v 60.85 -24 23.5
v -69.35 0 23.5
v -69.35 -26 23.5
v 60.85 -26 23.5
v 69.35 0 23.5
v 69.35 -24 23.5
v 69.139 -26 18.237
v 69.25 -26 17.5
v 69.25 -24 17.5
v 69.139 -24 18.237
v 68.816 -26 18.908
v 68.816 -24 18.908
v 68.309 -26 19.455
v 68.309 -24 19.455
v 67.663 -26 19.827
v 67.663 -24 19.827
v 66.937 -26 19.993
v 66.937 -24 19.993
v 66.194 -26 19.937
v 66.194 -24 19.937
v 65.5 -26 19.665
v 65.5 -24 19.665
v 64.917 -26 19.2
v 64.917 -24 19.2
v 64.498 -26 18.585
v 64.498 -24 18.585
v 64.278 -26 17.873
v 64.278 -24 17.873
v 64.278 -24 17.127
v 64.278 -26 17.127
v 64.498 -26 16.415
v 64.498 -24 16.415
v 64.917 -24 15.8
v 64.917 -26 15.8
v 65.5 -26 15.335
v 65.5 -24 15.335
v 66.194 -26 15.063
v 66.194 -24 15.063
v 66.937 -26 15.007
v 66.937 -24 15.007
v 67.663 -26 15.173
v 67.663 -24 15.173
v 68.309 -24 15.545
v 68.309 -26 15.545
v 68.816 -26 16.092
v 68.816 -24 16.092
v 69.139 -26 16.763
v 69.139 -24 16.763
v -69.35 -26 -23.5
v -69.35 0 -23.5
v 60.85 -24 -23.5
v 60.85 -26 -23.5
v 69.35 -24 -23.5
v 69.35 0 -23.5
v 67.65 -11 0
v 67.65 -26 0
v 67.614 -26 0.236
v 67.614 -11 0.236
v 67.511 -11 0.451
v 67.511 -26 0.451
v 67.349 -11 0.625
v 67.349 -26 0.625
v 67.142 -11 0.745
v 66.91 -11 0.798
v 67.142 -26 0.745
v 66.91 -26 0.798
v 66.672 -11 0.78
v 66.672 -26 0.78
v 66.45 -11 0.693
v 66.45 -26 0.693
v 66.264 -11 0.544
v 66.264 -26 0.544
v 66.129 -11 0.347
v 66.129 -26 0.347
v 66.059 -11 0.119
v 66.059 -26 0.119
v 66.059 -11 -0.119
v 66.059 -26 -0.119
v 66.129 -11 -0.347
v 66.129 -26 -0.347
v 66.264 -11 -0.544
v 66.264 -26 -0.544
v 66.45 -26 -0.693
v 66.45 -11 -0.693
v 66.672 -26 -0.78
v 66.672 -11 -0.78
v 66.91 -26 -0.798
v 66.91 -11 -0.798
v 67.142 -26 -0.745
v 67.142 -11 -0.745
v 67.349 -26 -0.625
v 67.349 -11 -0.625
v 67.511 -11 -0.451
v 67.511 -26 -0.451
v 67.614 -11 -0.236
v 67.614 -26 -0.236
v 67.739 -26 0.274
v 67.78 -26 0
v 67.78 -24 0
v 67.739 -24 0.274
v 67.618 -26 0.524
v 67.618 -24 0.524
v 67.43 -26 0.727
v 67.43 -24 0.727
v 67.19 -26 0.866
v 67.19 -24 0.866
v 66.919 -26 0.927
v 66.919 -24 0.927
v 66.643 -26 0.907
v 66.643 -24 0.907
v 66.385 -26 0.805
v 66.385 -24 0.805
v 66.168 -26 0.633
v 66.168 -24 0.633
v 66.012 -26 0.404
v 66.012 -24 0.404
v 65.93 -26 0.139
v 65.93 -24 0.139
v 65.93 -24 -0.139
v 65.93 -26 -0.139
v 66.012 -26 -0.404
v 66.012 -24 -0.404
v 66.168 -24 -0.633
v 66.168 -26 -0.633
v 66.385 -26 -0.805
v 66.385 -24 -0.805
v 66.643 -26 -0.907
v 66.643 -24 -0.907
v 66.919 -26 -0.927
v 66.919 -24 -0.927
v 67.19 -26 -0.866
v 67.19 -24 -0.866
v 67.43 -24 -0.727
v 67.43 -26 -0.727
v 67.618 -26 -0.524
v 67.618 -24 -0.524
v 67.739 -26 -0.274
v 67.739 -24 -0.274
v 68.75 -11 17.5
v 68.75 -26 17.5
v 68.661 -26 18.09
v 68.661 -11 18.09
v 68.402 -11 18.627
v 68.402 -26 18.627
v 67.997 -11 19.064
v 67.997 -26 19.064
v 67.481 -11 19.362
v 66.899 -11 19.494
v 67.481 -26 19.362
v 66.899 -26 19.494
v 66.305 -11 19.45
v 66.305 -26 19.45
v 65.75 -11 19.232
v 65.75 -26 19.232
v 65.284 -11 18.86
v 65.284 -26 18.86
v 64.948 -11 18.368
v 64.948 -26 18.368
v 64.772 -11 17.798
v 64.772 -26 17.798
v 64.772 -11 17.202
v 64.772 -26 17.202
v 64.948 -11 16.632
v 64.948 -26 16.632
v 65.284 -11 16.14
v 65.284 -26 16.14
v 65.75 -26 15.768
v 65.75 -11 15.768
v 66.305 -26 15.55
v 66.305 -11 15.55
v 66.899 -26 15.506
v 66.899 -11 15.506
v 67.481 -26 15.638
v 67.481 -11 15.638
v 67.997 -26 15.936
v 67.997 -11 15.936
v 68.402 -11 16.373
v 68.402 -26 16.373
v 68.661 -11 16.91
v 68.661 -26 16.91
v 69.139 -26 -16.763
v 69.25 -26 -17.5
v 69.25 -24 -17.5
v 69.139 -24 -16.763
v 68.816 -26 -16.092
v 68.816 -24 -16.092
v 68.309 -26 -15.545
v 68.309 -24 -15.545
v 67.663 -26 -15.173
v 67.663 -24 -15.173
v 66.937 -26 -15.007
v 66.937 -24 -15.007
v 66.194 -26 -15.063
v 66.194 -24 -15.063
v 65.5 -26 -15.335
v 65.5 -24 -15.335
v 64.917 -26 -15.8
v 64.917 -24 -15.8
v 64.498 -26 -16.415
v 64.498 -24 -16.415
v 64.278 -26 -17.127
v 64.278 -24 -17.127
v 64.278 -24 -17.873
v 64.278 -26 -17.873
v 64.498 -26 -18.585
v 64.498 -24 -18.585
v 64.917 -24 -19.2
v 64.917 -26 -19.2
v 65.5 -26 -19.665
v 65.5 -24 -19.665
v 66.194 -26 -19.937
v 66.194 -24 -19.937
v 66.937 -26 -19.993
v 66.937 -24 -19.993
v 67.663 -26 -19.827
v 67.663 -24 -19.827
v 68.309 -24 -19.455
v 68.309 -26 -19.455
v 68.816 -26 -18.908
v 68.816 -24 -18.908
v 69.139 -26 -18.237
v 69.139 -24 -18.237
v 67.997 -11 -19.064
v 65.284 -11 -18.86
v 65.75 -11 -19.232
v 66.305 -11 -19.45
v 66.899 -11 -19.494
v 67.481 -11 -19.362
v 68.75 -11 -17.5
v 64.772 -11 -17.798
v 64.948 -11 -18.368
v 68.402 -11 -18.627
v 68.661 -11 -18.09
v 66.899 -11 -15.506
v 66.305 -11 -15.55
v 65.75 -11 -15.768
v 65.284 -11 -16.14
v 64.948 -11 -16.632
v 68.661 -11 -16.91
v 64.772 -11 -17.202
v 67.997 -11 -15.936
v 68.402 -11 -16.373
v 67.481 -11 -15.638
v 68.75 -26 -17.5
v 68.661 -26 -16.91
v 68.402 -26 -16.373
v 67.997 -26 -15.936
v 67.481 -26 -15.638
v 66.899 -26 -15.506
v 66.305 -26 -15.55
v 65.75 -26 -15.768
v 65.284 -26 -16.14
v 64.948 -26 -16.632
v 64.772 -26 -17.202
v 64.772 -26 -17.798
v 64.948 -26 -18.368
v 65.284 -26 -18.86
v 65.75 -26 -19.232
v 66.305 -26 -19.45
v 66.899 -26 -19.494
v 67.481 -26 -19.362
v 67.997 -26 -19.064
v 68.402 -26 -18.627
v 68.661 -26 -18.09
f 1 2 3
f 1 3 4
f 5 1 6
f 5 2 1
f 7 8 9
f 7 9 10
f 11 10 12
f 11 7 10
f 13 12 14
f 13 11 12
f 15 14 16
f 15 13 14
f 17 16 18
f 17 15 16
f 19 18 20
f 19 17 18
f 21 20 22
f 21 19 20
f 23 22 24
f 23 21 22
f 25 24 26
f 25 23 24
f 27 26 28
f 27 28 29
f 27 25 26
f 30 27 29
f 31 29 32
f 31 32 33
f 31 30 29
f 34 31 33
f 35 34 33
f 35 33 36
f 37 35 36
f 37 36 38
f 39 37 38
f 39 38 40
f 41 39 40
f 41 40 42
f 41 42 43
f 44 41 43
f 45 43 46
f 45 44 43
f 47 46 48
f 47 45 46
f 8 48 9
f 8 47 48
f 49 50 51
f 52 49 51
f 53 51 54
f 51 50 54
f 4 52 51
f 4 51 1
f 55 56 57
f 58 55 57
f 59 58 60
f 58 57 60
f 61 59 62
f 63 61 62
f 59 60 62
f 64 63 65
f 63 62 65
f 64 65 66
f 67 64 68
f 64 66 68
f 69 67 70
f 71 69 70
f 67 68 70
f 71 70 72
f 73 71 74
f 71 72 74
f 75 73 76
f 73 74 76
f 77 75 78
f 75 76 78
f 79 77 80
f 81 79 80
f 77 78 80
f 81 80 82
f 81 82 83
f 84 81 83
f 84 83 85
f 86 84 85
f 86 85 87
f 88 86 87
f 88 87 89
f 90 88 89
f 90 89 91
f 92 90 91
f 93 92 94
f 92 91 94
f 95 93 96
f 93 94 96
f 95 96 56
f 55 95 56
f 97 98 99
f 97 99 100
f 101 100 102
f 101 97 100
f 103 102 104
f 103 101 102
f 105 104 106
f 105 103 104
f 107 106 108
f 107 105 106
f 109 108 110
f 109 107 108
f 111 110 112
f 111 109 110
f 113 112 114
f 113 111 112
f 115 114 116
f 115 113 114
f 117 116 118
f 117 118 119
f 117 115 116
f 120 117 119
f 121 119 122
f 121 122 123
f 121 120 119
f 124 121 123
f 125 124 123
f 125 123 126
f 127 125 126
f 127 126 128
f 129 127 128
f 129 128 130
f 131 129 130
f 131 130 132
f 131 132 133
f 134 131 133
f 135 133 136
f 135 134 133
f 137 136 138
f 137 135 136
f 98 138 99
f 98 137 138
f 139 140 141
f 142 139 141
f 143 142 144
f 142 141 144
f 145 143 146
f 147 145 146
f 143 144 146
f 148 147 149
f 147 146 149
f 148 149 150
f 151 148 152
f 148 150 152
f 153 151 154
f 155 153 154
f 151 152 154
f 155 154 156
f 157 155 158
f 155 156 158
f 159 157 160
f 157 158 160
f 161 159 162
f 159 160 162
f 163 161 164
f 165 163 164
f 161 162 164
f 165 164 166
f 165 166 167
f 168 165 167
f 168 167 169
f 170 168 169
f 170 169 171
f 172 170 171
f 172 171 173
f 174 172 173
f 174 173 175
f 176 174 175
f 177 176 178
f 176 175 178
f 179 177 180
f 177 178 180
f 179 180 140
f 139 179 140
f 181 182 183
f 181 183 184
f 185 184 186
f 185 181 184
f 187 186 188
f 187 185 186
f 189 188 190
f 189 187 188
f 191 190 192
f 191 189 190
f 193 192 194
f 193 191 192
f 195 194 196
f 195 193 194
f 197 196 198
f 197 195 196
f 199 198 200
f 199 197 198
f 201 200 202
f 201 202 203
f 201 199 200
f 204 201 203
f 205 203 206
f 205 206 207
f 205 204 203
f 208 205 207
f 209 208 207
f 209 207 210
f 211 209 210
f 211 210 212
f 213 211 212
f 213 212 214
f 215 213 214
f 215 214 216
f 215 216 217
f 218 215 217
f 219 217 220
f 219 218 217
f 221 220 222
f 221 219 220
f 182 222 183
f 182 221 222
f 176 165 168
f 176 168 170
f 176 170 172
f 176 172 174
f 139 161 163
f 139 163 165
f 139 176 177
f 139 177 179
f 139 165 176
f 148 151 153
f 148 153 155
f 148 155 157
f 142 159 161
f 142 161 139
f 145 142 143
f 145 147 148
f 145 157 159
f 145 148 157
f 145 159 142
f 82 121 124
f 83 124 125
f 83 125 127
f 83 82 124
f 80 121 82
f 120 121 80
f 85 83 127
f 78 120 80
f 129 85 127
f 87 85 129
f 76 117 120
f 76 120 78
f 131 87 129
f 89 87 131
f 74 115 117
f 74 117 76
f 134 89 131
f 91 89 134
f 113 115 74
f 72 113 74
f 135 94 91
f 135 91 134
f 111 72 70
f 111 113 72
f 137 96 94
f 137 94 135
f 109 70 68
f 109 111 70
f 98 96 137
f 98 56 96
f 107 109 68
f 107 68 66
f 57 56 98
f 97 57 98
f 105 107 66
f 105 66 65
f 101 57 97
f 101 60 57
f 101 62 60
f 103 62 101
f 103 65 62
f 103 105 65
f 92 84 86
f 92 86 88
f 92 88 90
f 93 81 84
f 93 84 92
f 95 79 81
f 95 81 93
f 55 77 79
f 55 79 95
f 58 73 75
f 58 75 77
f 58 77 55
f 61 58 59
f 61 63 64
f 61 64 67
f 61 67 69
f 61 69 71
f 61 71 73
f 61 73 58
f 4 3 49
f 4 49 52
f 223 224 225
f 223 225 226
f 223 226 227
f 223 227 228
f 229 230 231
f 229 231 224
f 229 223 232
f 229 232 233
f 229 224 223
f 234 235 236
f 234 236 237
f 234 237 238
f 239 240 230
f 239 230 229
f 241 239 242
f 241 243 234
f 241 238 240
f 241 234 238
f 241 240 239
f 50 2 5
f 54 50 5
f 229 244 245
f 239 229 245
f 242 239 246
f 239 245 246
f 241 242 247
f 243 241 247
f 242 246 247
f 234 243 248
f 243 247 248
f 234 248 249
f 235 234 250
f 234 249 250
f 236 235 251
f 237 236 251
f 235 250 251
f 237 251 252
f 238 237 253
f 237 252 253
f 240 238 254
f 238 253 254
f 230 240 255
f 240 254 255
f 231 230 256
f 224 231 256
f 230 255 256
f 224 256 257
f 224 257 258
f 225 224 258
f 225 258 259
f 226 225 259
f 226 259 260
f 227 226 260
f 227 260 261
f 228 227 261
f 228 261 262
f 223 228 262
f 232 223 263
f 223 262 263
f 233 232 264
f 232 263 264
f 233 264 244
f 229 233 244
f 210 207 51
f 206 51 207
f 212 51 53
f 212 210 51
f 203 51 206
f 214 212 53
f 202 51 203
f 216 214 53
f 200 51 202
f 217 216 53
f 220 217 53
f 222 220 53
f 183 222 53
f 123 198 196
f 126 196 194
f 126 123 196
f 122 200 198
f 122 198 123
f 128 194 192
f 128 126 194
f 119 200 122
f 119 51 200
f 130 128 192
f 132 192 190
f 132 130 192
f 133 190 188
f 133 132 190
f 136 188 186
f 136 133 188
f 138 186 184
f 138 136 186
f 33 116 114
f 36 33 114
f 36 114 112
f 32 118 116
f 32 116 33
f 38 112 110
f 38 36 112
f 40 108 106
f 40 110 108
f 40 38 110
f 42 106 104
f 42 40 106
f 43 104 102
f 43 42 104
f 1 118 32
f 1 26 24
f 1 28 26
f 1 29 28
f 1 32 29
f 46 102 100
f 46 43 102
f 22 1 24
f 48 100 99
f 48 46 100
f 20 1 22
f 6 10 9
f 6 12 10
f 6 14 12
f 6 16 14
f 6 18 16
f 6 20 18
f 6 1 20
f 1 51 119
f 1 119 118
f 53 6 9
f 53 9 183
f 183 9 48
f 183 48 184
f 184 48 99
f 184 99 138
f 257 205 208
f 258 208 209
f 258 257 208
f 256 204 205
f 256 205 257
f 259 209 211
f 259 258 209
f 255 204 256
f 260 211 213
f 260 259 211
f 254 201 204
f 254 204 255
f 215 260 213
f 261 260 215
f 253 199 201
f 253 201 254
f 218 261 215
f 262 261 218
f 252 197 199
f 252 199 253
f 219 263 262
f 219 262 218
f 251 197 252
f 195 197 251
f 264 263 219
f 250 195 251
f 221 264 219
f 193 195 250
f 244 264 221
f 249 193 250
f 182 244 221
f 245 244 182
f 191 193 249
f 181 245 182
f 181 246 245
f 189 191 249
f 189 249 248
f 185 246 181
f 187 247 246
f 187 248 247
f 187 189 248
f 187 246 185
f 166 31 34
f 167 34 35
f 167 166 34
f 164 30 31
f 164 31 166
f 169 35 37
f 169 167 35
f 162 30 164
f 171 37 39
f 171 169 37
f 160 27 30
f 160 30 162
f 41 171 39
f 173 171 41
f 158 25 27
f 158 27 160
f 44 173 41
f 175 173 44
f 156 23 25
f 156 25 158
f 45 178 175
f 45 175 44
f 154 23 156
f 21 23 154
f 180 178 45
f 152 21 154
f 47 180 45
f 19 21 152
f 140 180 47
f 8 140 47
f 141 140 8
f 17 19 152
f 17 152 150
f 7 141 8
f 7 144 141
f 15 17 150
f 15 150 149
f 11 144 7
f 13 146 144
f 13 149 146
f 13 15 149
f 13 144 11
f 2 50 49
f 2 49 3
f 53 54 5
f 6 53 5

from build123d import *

# Parameters (mm, degrees)
F0_W     = 138.7
F0_H     = 47
F1_DEPTH = 26
F2_W     = 8.5
F2_H     = 47
F2_R     = 2.5
F2_R_2   = 0.93
F3_DEPTH = 2
F2_R_3   = 0.8
F2_R_4   = 2
F4_DEPTH = 15


with BuildPart() as f1:
    # F0 (on Front) → F1 (new body)
    with BuildSketch(Plane.XZ):
        Rectangle(F0_W, F0_H)
    extrude(amount=F1_DEPTH)

    # F2 (on face) → F3 (cut)
    with BuildSketch(Plane.XZ.offset(26)):
        with Locations((65.1, 0)):
            Rectangle(F2_W, F2_H)
        with Locations((66.75, -17.5)):
            Circle(F2_R, mode=Mode.SUBTRACT)
        with Locations((66.85, 0)):
            Circle(F2_R_2, mode=Mode.SUBTRACT)
        with Locations((66.75, 17.5)):
            Circle(F2_R, mode=Mode.SUBTRACT)
    extrude(amount=-F3_DEPTH, mode=Mode.SUBTRACT)

    # F2 (on face) → F4 (cut)
    with BuildSketch(Plane.XZ.offset(26)):
        with Locations((66.85, 0)):
            Circle(F2_R_3)
        with Locations((66.75, 17.5)):
            Circle(F2_R_4)
        with Locations((66.75, -17.5)):
            Circle(F2_R_4)
    extrude(amount=-F4_DEPTH, mode=Mode.SUBTRACT)


solid = f1.part
